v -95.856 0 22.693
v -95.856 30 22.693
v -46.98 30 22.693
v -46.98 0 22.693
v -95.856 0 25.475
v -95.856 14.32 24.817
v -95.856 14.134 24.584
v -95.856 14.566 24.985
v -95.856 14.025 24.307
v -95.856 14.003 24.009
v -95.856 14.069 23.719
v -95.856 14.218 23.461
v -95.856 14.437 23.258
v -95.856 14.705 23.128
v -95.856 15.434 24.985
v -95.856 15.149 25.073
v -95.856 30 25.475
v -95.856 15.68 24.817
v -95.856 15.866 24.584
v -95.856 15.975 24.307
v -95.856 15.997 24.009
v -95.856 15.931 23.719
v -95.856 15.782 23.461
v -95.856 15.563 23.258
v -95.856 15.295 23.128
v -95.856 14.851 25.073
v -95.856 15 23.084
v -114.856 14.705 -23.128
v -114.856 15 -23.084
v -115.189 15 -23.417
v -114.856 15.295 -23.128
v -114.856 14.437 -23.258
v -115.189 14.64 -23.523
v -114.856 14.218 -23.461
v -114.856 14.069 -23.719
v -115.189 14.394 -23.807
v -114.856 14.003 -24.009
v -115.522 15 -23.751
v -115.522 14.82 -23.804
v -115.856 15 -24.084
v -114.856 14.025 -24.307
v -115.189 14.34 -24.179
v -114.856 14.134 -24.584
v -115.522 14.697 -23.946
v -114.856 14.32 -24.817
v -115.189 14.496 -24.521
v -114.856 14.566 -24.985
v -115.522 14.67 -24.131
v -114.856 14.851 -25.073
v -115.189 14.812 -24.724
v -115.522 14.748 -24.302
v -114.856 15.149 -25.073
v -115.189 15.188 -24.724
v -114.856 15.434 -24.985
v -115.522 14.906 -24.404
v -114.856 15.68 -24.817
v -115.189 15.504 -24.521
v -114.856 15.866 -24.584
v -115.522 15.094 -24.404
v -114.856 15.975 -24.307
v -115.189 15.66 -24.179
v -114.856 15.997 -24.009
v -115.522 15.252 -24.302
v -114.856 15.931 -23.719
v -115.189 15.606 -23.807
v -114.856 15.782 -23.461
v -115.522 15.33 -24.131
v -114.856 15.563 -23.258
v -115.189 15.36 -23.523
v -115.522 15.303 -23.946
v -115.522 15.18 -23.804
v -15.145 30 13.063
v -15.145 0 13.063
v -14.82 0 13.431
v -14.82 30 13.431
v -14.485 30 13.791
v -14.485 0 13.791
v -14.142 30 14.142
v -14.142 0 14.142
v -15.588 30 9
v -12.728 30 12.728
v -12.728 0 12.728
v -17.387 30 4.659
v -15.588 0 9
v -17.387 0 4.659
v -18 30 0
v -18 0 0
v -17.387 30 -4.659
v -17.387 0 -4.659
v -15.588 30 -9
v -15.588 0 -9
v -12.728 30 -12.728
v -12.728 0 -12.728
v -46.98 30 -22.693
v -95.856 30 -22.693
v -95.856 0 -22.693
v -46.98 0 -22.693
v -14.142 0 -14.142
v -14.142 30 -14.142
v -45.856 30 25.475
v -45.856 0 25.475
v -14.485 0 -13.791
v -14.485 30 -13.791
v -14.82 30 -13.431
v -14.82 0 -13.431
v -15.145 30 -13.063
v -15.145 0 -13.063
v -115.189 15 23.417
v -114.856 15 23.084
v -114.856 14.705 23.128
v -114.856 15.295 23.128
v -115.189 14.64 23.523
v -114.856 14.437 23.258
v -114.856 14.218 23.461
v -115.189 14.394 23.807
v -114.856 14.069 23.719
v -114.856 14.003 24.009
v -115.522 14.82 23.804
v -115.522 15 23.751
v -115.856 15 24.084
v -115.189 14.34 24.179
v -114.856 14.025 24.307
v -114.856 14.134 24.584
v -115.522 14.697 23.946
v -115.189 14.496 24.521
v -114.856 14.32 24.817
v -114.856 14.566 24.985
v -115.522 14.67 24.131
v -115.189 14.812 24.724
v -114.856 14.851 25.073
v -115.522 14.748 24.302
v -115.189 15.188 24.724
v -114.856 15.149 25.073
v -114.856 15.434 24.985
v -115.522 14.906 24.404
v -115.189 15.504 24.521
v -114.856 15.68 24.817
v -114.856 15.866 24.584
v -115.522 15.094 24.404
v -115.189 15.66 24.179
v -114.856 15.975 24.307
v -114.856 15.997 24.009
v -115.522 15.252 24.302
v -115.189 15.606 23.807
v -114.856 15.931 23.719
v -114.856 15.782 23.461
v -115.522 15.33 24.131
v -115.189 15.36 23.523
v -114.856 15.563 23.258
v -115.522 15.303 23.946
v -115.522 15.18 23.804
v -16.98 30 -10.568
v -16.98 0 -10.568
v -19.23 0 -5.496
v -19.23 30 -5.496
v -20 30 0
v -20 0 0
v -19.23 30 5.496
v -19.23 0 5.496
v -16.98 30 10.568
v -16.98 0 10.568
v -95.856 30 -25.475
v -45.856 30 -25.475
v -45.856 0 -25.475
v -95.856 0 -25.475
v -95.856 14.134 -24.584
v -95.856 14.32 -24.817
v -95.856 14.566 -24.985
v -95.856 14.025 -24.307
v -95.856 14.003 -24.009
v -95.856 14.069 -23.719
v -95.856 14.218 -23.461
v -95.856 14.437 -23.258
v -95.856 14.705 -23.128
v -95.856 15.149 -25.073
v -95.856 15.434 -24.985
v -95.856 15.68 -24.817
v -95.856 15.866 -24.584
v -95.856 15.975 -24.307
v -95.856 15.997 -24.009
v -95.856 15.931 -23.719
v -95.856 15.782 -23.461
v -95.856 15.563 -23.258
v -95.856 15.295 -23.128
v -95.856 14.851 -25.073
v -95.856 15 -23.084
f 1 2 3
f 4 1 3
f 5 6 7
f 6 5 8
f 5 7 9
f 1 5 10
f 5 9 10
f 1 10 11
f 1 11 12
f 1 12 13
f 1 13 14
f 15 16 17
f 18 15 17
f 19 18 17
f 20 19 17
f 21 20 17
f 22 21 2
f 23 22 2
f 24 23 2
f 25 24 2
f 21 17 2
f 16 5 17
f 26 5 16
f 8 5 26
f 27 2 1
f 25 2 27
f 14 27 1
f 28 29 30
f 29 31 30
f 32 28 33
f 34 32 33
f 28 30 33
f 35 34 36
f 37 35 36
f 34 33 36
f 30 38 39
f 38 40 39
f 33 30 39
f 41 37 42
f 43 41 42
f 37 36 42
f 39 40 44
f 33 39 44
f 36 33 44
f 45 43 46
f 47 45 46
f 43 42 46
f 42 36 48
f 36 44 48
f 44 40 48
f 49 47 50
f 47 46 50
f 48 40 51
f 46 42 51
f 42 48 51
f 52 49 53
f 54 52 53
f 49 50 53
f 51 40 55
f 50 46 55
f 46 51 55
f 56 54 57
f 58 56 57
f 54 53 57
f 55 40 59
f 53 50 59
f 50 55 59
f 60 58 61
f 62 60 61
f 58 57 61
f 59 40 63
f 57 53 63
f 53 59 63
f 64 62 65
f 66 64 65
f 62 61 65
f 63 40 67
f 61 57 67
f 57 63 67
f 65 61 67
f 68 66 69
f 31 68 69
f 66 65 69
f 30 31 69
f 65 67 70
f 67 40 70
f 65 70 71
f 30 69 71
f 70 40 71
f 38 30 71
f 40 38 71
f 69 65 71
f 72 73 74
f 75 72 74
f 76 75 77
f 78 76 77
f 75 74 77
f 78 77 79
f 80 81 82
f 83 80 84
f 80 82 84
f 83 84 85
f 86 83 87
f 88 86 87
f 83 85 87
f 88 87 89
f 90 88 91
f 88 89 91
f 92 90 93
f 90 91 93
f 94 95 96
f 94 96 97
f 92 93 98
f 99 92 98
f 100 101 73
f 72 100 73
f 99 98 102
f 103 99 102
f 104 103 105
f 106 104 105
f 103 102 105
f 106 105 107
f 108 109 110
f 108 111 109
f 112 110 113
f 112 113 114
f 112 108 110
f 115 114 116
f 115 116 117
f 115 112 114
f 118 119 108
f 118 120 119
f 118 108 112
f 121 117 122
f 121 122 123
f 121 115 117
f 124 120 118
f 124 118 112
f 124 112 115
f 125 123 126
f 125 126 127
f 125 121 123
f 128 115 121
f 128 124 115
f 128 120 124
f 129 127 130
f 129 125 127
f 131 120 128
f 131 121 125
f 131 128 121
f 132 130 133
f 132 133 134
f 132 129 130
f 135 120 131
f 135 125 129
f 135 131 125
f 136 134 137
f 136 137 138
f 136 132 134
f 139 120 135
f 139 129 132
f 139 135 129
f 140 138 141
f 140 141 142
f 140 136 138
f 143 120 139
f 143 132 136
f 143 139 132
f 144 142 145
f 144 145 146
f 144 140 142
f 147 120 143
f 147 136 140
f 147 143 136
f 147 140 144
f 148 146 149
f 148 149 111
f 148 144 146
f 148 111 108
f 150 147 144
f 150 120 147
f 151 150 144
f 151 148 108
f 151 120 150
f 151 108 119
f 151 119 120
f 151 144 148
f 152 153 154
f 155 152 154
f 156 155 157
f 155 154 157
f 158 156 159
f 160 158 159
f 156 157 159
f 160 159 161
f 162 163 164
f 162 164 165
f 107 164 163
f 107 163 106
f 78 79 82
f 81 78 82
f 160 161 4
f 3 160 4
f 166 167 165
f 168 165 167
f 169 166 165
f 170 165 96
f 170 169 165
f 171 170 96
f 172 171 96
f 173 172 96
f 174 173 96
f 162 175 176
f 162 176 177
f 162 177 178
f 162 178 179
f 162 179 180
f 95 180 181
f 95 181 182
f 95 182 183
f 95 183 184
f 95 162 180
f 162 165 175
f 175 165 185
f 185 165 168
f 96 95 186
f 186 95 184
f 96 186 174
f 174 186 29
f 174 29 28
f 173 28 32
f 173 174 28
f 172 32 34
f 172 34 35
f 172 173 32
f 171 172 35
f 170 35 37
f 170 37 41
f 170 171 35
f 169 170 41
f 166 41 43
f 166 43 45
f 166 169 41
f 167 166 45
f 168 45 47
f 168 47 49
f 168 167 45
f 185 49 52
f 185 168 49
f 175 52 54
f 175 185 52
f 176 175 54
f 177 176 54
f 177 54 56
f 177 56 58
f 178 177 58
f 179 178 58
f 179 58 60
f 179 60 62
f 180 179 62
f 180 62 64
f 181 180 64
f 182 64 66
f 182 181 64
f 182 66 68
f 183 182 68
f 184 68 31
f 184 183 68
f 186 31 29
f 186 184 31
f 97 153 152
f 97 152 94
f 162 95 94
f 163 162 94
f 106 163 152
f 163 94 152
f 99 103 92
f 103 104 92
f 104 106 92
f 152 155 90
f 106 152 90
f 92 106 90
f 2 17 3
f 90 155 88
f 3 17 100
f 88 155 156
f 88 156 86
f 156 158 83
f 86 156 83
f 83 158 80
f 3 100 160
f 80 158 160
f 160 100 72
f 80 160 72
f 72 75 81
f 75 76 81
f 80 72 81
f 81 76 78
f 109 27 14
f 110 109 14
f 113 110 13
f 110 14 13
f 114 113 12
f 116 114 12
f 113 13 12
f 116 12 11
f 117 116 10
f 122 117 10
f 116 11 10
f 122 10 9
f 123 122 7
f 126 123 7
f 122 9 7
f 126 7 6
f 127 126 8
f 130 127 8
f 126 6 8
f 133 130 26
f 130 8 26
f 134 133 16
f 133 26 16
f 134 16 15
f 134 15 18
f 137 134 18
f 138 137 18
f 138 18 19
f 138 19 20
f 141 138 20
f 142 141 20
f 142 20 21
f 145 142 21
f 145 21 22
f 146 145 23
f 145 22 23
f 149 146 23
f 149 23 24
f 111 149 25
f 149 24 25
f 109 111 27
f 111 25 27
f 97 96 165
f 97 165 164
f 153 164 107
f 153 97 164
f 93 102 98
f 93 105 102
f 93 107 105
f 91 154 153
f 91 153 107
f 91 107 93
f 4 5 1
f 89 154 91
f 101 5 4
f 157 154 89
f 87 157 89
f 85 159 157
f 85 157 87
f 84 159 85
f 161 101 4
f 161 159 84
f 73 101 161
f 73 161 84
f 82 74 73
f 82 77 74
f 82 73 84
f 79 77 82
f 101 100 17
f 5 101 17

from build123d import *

# Parameters (mm, degrees)
BOSS_EXTRUDE2_DEPTH      = 30
BOSS_EXTRUDE3_START      = -30
BOSS_EXTRUDE3_DEPTH      = 30
BOSS_EXTRUDE4_DEPTH      = 30
SKETCH15_R               = 1
BOSS_EXTRUDE5_DEPTH      = 20
CHAMFER1_SIZE            = 1
CHAMFER1_OF_MIRROR2_SIZE = 1


with BuildPart() as part:
    # Sketch5 → Boss-Extrude2 (new body)
    with BuildSketch(Plane(origin=(0, 0, 0), x_dir=(1, 0, 0), z_dir=(0, 1, 0))):
        with BuildLine():
            Line((-12.727922061, 12.727922061), (-14.142135624, 14.142135624))
            ThreePointArc((-14.142135624, 14.142135624), (-20, 0), (-14.142135624, -14.142135624))
            Line((-14.142135624, -14.142135624), (-12.727922061, -12.727922061))
            ThreePointArc((-12.727922061, -12.727922061), (-18, 0), (-12.727922061, 12.727922061))
        make_face()
    extrude(amount=BOSS_EXTRUDE2_DEPTH)

    # Sketch12 → Boss-Extrude3 (add)
    with BuildSketch(Plane(origin=(0, 30, 0), x_dir=(1, 0, 0), z_dir=(0, 1, 0)).offset(BOSS_EXTRUDE3_START)):
        with BuildLine():
            Line((-16.979679072, 10.568372562), (-46.979679072, 22.693353002))
            Line((-46.979679072, 22.693353002), (-45.855525051, 25.474769501))
            Line((-45.855525051, 25.474769501), (-15.144925587, 13.062588907))
            ThreePointArc((-15.144925587, 13.062588907), (-14.653475488, 13.611600058), (-14.142135624, 14.142135624))
            Line((-14.142135624, 14.142135624), (-12.727922061, 12.727922061))
            ThreePointArc((-12.727922061, 12.727922061), (-18, 0), (-12.727922061, -12.727922061))
            Line((-12.727922061, -12.727922061), (-14.142135624, -14.142135624))
            ThreePointArc((-14.142135624, -14.142135624), (-19.869427299, -2.281635118), (-16.979679072, 10.568372562))
        make_face()
    boss_extrude3 = extrude(amount=BOSS_EXTRUDE3_DEPTH)

    # Sketch14 → Boss-Extrude4 (add)
    with BuildSketch(Plane(origin=(0, 30, 0), x_dir=(1, 0, 0), z_dir=(0, 1, 0))):
        Polygon((-45.855525051, 25.474769501), (-95.855525051, 25.474769501), (-95.855525051, 22.693353002), (-46.979679072, 22.693353002), align=None)
    boss_extrude4 = extrude(amount=-BOSS_EXTRUDE4_DEPTH)

    # Mirror1: Boss-Extrude3, Boss-Extrude4 across plane
    add(boss_extrude3.mirror(Plane(origin=(0, 0, 0), x_dir=(1, 0, 0), z_dir=(0, 0, -1))))
    add(boss_extrude4.mirror(Plane(origin=(0, 0, 0), x_dir=(1, 0, 0), z_dir=(0, 0, -1))))

    # Sketch15 → Boss-Extrude5 (add)
    with BuildSketch(Plane.ZY.offset(95.855525051)):
        with Locations(Location((24.084061252, 15, 0), (0, 0, 180))):
            Circle(SKETCH15_R)
    boss_extrude5 = extrude(amount=BOSS_EXTRUDE5_DEPTH)

    # Chamfer1
    chamfer1_edges = [part.edges().sort_by_distance(p)[0] for p in [
        (-115.855525051, 15, 25.084061252),
    ]]
    chamfer(chamfer1_edges, length=CHAMFER1_SIZE)

    # Mirror2: Boss-Extrude5 across plane
    add(boss_extrude5.mirror(Plane(origin=(0, 0, 0), x_dir=(1, 0, 0), z_dir=(0, 0, -1))))

    # Chamfer1 of Mirror2
    chamfer1_of_mirror2_edges = [part.edges().sort_by_distance(p)[0] for p in [
        (-115.855525051, 15, -25.084061252),
    ]]
    chamfer(chamfer1_of_mirror2_edges, length=CHAMFER1_OF_MIRROR2_SIZE)


solid = part.part
